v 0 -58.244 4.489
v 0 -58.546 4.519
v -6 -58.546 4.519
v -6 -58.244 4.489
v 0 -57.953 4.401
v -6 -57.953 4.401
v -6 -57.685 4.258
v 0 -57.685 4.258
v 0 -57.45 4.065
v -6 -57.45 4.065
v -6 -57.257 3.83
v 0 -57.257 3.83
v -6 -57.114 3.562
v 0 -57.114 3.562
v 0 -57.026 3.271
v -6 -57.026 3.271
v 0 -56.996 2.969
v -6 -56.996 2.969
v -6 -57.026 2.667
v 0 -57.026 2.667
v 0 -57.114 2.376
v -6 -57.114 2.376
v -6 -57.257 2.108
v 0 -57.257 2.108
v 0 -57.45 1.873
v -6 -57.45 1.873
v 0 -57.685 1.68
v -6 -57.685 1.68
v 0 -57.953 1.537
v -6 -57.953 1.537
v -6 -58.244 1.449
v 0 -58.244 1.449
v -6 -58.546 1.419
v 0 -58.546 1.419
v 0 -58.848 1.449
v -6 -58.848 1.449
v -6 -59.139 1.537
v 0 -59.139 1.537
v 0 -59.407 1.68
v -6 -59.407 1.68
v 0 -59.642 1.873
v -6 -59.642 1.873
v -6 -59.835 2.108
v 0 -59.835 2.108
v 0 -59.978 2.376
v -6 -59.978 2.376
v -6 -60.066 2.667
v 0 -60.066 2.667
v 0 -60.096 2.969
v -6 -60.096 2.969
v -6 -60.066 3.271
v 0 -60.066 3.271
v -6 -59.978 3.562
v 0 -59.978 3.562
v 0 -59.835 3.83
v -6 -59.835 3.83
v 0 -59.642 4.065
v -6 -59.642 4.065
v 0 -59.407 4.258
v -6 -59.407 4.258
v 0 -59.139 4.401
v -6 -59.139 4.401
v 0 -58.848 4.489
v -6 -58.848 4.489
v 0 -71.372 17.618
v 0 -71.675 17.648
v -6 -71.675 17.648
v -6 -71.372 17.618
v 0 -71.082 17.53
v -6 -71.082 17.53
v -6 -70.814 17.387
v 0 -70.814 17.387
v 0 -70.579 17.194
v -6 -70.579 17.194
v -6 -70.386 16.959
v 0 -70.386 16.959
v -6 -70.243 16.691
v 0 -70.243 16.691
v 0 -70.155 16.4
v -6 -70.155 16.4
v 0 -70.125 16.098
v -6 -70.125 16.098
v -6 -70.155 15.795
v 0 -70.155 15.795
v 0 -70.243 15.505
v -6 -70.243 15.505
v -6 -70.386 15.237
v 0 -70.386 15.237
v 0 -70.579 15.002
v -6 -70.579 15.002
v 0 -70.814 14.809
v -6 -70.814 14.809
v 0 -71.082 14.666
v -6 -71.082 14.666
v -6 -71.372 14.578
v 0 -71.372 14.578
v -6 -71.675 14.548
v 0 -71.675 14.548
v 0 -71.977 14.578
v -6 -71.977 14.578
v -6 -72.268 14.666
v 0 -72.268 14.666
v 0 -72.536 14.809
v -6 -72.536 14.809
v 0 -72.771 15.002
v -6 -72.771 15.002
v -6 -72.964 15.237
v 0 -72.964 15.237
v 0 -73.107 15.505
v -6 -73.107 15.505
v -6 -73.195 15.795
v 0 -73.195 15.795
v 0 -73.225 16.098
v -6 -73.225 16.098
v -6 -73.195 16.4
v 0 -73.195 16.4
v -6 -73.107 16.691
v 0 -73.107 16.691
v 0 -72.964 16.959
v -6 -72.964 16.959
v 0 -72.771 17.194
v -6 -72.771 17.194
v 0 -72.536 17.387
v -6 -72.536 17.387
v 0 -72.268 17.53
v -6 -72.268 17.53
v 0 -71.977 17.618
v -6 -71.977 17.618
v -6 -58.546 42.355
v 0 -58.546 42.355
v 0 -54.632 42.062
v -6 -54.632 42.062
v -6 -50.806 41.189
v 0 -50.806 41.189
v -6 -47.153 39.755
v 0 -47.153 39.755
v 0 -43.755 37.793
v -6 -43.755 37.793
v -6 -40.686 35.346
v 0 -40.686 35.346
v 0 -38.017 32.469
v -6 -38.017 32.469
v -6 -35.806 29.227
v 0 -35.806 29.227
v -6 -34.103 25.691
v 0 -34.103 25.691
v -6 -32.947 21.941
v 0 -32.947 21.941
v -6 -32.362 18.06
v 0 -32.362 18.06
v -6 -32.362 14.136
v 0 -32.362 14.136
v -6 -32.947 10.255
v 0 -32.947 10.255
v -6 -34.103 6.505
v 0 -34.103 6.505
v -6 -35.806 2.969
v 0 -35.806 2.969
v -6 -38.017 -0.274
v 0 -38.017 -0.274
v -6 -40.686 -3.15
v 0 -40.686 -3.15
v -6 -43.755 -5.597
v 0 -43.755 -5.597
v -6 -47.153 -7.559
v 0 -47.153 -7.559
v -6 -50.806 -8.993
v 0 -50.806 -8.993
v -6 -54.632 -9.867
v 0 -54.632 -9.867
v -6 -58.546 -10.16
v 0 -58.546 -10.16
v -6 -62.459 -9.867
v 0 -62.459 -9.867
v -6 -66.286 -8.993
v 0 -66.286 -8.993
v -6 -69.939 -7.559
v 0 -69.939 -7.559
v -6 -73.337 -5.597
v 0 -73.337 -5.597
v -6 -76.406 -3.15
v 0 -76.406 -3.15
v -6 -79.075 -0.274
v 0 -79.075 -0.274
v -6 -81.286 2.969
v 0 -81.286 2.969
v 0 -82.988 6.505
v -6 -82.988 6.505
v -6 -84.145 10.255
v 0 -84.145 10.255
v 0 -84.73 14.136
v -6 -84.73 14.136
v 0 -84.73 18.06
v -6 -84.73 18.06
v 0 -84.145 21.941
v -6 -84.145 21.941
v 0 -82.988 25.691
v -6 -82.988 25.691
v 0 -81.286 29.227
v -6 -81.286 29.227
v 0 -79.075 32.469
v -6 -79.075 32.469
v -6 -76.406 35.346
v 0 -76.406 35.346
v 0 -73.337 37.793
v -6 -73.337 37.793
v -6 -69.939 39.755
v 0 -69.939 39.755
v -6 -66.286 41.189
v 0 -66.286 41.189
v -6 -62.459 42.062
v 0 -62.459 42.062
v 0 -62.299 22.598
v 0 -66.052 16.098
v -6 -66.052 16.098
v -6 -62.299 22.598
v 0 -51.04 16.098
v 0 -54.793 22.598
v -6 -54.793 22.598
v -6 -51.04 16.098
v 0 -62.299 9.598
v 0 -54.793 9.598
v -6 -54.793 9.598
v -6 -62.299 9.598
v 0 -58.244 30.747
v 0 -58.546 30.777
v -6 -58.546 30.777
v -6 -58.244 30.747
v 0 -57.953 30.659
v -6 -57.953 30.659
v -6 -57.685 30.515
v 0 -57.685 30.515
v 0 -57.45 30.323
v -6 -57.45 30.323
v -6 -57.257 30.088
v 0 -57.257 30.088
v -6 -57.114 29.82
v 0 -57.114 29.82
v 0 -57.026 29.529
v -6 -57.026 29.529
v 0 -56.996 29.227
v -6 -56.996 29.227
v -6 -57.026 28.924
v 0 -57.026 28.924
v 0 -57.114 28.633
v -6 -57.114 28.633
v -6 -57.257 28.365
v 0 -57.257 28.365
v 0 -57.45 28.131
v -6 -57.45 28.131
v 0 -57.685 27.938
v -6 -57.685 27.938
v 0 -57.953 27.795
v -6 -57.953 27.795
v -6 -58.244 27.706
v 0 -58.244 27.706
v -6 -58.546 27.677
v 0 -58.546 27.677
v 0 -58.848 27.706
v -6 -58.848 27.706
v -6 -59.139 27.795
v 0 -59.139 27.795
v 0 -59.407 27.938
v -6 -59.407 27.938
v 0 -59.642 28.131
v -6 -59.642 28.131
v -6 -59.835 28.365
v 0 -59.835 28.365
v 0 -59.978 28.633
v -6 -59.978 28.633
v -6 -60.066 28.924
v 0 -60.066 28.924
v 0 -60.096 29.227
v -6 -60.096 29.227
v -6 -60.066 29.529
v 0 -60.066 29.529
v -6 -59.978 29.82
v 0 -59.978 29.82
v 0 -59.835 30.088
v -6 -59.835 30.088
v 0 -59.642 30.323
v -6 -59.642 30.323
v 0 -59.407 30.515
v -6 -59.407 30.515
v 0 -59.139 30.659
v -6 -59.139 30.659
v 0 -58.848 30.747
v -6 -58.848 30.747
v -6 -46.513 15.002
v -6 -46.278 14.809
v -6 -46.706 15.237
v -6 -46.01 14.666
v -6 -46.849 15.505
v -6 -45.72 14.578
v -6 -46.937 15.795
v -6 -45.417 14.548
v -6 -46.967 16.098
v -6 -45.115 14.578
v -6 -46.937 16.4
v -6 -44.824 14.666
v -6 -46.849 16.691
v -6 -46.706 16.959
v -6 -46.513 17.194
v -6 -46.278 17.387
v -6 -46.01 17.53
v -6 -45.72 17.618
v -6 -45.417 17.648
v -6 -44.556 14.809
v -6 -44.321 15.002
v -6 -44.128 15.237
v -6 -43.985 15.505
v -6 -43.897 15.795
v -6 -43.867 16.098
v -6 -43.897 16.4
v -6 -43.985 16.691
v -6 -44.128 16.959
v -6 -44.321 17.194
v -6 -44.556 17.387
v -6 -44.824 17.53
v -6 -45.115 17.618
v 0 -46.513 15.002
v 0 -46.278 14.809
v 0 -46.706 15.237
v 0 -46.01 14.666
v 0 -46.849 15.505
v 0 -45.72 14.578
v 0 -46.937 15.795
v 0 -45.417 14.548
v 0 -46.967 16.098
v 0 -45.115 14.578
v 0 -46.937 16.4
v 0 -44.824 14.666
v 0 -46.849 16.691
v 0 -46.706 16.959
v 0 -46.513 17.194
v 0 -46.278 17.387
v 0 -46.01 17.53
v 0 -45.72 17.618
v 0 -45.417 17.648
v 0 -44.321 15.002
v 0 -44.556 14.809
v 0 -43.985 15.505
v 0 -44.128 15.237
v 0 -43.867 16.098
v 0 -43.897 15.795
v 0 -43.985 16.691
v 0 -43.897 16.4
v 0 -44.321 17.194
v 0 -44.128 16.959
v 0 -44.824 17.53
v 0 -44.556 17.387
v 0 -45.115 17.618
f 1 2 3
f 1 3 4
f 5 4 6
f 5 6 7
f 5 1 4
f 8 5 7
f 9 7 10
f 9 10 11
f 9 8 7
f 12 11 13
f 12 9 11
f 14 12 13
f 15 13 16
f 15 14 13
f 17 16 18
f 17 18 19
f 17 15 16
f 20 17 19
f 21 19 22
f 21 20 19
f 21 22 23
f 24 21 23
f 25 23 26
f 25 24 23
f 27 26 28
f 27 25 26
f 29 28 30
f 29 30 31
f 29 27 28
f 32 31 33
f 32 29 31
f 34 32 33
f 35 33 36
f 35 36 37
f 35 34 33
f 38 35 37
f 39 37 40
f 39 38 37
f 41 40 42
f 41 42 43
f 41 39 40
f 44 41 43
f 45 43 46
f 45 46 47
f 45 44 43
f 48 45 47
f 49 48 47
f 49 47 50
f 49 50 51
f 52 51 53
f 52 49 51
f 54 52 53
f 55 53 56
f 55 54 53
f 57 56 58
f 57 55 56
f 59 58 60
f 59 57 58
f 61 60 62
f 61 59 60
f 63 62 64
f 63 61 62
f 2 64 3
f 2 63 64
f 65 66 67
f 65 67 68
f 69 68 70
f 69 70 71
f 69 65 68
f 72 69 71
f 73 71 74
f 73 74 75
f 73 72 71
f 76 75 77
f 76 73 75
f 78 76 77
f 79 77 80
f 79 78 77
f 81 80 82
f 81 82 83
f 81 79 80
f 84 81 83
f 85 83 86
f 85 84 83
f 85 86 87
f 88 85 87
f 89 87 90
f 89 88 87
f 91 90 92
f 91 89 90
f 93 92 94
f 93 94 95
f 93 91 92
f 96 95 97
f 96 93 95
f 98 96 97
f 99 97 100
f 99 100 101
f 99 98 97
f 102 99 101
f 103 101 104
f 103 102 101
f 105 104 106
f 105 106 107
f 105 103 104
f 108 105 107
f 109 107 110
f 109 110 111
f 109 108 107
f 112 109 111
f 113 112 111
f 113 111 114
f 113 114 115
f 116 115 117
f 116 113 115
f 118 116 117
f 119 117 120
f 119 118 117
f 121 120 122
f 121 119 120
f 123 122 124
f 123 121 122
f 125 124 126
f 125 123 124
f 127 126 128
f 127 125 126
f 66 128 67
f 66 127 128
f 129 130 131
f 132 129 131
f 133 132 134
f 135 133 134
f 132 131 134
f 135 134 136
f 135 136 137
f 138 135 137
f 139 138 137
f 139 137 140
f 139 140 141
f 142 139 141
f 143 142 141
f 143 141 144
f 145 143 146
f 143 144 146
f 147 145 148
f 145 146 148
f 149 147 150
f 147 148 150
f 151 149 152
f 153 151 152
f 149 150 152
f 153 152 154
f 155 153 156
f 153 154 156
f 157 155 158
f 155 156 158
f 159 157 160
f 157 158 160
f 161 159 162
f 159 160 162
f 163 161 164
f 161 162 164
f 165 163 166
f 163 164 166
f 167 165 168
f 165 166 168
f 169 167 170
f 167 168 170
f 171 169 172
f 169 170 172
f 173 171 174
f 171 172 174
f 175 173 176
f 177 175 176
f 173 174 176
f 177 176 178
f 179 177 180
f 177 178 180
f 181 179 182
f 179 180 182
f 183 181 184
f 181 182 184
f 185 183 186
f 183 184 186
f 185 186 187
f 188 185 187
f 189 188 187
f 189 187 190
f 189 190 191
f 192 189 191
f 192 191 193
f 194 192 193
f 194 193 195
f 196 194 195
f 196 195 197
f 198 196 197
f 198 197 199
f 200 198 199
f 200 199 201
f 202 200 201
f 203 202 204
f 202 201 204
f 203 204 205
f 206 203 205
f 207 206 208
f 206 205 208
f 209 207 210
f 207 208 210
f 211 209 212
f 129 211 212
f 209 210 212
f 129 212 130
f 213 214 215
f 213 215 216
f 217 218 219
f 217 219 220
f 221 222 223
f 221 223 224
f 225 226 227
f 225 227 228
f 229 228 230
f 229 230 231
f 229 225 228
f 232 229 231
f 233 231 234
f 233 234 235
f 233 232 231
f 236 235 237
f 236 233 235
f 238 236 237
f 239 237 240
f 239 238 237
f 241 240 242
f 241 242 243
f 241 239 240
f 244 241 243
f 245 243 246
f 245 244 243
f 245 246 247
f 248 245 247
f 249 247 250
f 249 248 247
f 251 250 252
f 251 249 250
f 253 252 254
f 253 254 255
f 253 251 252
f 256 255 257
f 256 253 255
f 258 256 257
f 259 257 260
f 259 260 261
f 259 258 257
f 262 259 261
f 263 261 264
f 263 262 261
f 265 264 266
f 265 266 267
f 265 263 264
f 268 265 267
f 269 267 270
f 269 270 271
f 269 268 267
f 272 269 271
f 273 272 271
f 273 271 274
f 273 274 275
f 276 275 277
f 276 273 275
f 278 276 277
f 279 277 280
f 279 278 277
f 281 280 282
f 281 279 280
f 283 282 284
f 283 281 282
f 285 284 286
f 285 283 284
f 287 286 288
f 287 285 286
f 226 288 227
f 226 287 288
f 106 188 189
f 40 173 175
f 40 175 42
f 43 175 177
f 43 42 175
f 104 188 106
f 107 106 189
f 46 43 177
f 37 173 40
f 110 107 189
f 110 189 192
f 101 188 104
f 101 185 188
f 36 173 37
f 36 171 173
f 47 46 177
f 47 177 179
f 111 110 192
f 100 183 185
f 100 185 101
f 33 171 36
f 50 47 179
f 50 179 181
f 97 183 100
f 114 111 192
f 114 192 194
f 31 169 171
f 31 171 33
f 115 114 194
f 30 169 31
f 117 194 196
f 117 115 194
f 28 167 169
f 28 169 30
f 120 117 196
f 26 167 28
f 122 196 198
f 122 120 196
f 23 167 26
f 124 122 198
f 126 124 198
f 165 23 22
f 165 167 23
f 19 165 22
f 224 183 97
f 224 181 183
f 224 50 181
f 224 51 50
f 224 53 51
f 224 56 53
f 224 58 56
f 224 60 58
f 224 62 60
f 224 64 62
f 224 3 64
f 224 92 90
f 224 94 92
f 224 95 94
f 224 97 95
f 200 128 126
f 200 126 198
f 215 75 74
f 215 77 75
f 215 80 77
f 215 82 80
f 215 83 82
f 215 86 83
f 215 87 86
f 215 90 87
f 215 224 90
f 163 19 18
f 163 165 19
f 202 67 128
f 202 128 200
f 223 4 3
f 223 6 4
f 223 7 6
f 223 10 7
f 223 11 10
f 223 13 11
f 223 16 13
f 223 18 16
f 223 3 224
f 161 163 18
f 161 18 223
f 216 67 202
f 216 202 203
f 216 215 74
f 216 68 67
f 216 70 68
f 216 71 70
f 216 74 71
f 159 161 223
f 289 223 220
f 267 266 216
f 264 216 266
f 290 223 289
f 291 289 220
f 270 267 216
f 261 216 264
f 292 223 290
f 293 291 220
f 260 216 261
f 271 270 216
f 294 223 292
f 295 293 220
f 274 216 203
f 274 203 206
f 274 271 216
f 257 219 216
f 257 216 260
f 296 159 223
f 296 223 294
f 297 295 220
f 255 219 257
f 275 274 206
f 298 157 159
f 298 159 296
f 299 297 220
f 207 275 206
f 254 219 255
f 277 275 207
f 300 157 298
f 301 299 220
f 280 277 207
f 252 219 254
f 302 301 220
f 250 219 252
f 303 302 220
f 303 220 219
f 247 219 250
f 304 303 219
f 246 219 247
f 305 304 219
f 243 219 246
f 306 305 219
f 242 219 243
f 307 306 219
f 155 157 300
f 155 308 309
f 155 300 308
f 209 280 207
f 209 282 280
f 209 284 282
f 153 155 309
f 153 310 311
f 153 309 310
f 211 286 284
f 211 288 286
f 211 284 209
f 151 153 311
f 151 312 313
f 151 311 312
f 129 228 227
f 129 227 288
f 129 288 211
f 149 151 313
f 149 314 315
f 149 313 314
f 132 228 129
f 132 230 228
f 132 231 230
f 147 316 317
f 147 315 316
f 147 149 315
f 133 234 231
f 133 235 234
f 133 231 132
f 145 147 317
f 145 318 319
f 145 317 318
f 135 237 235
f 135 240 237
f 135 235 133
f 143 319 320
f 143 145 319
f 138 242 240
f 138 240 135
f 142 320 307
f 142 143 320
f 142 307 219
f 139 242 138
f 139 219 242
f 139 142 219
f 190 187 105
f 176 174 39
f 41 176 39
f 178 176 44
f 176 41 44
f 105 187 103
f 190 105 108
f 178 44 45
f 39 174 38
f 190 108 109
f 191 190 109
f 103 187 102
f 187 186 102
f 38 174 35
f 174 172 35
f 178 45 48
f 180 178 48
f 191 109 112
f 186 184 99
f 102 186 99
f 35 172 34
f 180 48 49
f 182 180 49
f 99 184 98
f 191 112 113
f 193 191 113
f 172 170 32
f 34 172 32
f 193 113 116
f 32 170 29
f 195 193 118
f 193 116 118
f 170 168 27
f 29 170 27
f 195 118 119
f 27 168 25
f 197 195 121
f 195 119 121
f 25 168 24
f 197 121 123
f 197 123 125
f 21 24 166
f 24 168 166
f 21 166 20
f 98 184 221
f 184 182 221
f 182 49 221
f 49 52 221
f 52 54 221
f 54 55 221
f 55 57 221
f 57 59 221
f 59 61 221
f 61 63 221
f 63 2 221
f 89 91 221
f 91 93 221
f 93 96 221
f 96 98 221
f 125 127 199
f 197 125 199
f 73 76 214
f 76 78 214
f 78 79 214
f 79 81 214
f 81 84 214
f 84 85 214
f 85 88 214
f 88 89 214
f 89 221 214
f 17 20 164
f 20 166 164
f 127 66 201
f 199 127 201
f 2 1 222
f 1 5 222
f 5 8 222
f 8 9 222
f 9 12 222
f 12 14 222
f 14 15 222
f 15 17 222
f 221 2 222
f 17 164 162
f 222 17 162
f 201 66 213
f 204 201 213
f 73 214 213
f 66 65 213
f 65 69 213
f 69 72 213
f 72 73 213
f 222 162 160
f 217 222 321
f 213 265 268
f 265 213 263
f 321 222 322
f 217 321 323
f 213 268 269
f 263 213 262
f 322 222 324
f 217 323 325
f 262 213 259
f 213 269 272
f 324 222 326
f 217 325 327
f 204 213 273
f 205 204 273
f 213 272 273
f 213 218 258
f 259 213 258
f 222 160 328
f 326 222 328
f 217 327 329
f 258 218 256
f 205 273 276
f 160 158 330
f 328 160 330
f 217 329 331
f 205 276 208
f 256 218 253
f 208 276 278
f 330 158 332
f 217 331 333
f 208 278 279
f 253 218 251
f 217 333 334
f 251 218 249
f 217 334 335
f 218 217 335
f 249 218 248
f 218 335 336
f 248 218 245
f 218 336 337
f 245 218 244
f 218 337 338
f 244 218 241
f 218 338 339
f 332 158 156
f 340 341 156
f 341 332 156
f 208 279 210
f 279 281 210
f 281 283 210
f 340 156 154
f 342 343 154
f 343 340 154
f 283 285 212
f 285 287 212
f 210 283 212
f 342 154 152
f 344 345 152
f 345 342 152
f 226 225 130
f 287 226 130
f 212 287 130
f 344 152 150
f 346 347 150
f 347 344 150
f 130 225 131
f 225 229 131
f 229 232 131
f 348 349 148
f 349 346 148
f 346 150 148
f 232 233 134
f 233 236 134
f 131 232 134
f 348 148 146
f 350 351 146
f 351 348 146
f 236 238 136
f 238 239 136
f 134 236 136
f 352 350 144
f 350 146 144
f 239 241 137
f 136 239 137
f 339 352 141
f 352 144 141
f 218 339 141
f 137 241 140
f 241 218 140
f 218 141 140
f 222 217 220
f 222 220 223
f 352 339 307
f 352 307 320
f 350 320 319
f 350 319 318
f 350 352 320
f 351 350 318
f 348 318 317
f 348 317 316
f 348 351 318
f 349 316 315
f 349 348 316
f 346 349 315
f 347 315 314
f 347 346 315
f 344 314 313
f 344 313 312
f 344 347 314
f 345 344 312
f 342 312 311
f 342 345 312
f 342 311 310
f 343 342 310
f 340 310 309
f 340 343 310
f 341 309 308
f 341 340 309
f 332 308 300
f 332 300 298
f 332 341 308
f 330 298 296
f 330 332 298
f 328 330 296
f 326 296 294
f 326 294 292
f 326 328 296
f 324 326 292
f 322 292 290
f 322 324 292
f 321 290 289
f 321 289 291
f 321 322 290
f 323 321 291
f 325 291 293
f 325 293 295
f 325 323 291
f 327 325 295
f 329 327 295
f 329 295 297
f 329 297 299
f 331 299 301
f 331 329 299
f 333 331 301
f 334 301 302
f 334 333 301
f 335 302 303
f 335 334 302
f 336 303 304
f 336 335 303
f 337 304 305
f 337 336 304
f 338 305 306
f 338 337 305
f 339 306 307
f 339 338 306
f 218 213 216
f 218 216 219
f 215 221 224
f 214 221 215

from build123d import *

# Parameters (mm, degrees)
ESQUISSE1_R        = 26.257549031
ESQUISSE1_R_2      = 1.55
BOSS_EXTRU_1_DEPTH = 6


with BuildPart() as part:
    # Esquisse1 → Boss.-Extru.1 (new body)
    with BuildSketch(Plane.ZY):
        with Locations((16.097760006, -58.545962001)):
            Circle(ESQUISSE1_R)
        with Locations((29.226534372, -58.545962001)):
            Circle(ESQUISSE1_R_2, mode=Mode.SUBTRACT)
        with Locations((16.097760006, -45.417187634)):
            Circle(ESQUISSE1_R_2, mode=Mode.SUBTRACT)
        with Locations((2.968985639, -58.545962001)):
            Circle(ESQUISSE1_R_2, mode=Mode.SUBTRACT)
        with Locations((16.097760006, -71.674736367)):
            Circle(ESQUISSE1_R_2, mode=Mode.SUBTRACT)
        Polygon((16.097760006, -51.040408501), (9.597760006, -54.793185251), (9.597760006, -62.29873875), (16.097760006, -66.0515155), (22.597760006, -62.29873875), (22.597760006, -54.793185251), align=None, mode=Mode.SUBTRACT)
    extrude(amount=BOSS_EXTRU_1_DEPTH)


solid = part.part
